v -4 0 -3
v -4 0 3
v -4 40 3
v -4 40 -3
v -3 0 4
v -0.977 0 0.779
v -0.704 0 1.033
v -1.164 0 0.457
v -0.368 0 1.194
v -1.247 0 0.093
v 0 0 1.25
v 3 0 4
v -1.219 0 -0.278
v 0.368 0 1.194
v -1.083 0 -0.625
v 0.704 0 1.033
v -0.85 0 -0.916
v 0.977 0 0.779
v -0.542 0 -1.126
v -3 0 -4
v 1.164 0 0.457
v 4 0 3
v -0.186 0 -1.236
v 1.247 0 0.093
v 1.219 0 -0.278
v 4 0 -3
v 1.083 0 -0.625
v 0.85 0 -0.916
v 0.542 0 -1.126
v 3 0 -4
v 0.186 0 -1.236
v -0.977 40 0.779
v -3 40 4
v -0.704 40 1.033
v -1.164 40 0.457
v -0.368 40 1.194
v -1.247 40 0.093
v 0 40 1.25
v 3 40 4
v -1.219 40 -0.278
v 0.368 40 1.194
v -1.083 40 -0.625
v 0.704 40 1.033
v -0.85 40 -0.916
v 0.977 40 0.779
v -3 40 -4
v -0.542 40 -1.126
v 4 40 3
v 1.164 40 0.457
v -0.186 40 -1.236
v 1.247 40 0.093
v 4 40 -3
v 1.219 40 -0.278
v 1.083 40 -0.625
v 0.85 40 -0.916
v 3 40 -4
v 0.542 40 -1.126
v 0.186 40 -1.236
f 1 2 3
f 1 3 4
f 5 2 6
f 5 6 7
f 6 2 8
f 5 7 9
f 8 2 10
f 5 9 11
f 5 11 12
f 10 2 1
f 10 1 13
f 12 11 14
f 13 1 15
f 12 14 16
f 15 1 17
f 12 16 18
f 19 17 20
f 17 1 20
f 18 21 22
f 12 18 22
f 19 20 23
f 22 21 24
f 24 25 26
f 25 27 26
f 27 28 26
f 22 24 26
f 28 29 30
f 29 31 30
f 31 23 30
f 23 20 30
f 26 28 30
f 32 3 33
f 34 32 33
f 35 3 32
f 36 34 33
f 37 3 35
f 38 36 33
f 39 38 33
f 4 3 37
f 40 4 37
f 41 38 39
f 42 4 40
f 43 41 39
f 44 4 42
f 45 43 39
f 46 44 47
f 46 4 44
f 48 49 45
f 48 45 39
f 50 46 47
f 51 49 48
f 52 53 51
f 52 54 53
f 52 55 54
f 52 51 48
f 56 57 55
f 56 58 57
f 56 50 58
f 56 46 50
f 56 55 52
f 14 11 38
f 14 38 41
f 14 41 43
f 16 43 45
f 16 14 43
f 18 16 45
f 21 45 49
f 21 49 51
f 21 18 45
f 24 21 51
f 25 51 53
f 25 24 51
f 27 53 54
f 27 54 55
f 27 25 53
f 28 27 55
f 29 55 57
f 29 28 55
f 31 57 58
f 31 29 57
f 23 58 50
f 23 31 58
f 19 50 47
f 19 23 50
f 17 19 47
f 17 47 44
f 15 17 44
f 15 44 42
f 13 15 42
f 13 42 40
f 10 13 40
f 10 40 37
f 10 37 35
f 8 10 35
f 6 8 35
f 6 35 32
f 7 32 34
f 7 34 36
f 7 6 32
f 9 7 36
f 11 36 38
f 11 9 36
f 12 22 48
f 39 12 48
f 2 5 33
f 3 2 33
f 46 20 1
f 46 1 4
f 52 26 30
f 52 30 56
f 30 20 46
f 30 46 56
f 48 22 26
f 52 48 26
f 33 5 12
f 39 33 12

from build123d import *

# Parameters (mm, degrees)
SKETCH_1_W        = 8
SKETCH_1_H        = 8
SKETCH_1_R        = 1.25
EXTRUDE_349_DEPTH = 40
CHAMFER_1_SIZE    = 1


with BuildPart() as part:
    # Эскиз1 → Extrude 349 (new body)
    with BuildSketch(Plane(origin=(0, 0, 0), x_dir=(1, 0, 0), z_dir=(0, 1, 0))):
        Rectangle(SKETCH_1_W, SKETCH_1_H)
        with Locations(Location((0, 0, 0), (0, 0, 270))):
            Circle(SKETCH_1_R, mode=Mode.SUBTRACT)
    extrude(amount=EXTRUDE_349_DEPTH)

    # Фаска1
    chamfer_1_edges = [part.edges().sort_by_distance(p)[0] for p in [
        (4, 20, 4),
        (-4, 20, 4),
        (-4, 20, -4),
        (4, 20, -4),
    ]]
    chamfer(chamfer_1_edges, length=CHAMFER_1_SIZE)


solid = part.part
